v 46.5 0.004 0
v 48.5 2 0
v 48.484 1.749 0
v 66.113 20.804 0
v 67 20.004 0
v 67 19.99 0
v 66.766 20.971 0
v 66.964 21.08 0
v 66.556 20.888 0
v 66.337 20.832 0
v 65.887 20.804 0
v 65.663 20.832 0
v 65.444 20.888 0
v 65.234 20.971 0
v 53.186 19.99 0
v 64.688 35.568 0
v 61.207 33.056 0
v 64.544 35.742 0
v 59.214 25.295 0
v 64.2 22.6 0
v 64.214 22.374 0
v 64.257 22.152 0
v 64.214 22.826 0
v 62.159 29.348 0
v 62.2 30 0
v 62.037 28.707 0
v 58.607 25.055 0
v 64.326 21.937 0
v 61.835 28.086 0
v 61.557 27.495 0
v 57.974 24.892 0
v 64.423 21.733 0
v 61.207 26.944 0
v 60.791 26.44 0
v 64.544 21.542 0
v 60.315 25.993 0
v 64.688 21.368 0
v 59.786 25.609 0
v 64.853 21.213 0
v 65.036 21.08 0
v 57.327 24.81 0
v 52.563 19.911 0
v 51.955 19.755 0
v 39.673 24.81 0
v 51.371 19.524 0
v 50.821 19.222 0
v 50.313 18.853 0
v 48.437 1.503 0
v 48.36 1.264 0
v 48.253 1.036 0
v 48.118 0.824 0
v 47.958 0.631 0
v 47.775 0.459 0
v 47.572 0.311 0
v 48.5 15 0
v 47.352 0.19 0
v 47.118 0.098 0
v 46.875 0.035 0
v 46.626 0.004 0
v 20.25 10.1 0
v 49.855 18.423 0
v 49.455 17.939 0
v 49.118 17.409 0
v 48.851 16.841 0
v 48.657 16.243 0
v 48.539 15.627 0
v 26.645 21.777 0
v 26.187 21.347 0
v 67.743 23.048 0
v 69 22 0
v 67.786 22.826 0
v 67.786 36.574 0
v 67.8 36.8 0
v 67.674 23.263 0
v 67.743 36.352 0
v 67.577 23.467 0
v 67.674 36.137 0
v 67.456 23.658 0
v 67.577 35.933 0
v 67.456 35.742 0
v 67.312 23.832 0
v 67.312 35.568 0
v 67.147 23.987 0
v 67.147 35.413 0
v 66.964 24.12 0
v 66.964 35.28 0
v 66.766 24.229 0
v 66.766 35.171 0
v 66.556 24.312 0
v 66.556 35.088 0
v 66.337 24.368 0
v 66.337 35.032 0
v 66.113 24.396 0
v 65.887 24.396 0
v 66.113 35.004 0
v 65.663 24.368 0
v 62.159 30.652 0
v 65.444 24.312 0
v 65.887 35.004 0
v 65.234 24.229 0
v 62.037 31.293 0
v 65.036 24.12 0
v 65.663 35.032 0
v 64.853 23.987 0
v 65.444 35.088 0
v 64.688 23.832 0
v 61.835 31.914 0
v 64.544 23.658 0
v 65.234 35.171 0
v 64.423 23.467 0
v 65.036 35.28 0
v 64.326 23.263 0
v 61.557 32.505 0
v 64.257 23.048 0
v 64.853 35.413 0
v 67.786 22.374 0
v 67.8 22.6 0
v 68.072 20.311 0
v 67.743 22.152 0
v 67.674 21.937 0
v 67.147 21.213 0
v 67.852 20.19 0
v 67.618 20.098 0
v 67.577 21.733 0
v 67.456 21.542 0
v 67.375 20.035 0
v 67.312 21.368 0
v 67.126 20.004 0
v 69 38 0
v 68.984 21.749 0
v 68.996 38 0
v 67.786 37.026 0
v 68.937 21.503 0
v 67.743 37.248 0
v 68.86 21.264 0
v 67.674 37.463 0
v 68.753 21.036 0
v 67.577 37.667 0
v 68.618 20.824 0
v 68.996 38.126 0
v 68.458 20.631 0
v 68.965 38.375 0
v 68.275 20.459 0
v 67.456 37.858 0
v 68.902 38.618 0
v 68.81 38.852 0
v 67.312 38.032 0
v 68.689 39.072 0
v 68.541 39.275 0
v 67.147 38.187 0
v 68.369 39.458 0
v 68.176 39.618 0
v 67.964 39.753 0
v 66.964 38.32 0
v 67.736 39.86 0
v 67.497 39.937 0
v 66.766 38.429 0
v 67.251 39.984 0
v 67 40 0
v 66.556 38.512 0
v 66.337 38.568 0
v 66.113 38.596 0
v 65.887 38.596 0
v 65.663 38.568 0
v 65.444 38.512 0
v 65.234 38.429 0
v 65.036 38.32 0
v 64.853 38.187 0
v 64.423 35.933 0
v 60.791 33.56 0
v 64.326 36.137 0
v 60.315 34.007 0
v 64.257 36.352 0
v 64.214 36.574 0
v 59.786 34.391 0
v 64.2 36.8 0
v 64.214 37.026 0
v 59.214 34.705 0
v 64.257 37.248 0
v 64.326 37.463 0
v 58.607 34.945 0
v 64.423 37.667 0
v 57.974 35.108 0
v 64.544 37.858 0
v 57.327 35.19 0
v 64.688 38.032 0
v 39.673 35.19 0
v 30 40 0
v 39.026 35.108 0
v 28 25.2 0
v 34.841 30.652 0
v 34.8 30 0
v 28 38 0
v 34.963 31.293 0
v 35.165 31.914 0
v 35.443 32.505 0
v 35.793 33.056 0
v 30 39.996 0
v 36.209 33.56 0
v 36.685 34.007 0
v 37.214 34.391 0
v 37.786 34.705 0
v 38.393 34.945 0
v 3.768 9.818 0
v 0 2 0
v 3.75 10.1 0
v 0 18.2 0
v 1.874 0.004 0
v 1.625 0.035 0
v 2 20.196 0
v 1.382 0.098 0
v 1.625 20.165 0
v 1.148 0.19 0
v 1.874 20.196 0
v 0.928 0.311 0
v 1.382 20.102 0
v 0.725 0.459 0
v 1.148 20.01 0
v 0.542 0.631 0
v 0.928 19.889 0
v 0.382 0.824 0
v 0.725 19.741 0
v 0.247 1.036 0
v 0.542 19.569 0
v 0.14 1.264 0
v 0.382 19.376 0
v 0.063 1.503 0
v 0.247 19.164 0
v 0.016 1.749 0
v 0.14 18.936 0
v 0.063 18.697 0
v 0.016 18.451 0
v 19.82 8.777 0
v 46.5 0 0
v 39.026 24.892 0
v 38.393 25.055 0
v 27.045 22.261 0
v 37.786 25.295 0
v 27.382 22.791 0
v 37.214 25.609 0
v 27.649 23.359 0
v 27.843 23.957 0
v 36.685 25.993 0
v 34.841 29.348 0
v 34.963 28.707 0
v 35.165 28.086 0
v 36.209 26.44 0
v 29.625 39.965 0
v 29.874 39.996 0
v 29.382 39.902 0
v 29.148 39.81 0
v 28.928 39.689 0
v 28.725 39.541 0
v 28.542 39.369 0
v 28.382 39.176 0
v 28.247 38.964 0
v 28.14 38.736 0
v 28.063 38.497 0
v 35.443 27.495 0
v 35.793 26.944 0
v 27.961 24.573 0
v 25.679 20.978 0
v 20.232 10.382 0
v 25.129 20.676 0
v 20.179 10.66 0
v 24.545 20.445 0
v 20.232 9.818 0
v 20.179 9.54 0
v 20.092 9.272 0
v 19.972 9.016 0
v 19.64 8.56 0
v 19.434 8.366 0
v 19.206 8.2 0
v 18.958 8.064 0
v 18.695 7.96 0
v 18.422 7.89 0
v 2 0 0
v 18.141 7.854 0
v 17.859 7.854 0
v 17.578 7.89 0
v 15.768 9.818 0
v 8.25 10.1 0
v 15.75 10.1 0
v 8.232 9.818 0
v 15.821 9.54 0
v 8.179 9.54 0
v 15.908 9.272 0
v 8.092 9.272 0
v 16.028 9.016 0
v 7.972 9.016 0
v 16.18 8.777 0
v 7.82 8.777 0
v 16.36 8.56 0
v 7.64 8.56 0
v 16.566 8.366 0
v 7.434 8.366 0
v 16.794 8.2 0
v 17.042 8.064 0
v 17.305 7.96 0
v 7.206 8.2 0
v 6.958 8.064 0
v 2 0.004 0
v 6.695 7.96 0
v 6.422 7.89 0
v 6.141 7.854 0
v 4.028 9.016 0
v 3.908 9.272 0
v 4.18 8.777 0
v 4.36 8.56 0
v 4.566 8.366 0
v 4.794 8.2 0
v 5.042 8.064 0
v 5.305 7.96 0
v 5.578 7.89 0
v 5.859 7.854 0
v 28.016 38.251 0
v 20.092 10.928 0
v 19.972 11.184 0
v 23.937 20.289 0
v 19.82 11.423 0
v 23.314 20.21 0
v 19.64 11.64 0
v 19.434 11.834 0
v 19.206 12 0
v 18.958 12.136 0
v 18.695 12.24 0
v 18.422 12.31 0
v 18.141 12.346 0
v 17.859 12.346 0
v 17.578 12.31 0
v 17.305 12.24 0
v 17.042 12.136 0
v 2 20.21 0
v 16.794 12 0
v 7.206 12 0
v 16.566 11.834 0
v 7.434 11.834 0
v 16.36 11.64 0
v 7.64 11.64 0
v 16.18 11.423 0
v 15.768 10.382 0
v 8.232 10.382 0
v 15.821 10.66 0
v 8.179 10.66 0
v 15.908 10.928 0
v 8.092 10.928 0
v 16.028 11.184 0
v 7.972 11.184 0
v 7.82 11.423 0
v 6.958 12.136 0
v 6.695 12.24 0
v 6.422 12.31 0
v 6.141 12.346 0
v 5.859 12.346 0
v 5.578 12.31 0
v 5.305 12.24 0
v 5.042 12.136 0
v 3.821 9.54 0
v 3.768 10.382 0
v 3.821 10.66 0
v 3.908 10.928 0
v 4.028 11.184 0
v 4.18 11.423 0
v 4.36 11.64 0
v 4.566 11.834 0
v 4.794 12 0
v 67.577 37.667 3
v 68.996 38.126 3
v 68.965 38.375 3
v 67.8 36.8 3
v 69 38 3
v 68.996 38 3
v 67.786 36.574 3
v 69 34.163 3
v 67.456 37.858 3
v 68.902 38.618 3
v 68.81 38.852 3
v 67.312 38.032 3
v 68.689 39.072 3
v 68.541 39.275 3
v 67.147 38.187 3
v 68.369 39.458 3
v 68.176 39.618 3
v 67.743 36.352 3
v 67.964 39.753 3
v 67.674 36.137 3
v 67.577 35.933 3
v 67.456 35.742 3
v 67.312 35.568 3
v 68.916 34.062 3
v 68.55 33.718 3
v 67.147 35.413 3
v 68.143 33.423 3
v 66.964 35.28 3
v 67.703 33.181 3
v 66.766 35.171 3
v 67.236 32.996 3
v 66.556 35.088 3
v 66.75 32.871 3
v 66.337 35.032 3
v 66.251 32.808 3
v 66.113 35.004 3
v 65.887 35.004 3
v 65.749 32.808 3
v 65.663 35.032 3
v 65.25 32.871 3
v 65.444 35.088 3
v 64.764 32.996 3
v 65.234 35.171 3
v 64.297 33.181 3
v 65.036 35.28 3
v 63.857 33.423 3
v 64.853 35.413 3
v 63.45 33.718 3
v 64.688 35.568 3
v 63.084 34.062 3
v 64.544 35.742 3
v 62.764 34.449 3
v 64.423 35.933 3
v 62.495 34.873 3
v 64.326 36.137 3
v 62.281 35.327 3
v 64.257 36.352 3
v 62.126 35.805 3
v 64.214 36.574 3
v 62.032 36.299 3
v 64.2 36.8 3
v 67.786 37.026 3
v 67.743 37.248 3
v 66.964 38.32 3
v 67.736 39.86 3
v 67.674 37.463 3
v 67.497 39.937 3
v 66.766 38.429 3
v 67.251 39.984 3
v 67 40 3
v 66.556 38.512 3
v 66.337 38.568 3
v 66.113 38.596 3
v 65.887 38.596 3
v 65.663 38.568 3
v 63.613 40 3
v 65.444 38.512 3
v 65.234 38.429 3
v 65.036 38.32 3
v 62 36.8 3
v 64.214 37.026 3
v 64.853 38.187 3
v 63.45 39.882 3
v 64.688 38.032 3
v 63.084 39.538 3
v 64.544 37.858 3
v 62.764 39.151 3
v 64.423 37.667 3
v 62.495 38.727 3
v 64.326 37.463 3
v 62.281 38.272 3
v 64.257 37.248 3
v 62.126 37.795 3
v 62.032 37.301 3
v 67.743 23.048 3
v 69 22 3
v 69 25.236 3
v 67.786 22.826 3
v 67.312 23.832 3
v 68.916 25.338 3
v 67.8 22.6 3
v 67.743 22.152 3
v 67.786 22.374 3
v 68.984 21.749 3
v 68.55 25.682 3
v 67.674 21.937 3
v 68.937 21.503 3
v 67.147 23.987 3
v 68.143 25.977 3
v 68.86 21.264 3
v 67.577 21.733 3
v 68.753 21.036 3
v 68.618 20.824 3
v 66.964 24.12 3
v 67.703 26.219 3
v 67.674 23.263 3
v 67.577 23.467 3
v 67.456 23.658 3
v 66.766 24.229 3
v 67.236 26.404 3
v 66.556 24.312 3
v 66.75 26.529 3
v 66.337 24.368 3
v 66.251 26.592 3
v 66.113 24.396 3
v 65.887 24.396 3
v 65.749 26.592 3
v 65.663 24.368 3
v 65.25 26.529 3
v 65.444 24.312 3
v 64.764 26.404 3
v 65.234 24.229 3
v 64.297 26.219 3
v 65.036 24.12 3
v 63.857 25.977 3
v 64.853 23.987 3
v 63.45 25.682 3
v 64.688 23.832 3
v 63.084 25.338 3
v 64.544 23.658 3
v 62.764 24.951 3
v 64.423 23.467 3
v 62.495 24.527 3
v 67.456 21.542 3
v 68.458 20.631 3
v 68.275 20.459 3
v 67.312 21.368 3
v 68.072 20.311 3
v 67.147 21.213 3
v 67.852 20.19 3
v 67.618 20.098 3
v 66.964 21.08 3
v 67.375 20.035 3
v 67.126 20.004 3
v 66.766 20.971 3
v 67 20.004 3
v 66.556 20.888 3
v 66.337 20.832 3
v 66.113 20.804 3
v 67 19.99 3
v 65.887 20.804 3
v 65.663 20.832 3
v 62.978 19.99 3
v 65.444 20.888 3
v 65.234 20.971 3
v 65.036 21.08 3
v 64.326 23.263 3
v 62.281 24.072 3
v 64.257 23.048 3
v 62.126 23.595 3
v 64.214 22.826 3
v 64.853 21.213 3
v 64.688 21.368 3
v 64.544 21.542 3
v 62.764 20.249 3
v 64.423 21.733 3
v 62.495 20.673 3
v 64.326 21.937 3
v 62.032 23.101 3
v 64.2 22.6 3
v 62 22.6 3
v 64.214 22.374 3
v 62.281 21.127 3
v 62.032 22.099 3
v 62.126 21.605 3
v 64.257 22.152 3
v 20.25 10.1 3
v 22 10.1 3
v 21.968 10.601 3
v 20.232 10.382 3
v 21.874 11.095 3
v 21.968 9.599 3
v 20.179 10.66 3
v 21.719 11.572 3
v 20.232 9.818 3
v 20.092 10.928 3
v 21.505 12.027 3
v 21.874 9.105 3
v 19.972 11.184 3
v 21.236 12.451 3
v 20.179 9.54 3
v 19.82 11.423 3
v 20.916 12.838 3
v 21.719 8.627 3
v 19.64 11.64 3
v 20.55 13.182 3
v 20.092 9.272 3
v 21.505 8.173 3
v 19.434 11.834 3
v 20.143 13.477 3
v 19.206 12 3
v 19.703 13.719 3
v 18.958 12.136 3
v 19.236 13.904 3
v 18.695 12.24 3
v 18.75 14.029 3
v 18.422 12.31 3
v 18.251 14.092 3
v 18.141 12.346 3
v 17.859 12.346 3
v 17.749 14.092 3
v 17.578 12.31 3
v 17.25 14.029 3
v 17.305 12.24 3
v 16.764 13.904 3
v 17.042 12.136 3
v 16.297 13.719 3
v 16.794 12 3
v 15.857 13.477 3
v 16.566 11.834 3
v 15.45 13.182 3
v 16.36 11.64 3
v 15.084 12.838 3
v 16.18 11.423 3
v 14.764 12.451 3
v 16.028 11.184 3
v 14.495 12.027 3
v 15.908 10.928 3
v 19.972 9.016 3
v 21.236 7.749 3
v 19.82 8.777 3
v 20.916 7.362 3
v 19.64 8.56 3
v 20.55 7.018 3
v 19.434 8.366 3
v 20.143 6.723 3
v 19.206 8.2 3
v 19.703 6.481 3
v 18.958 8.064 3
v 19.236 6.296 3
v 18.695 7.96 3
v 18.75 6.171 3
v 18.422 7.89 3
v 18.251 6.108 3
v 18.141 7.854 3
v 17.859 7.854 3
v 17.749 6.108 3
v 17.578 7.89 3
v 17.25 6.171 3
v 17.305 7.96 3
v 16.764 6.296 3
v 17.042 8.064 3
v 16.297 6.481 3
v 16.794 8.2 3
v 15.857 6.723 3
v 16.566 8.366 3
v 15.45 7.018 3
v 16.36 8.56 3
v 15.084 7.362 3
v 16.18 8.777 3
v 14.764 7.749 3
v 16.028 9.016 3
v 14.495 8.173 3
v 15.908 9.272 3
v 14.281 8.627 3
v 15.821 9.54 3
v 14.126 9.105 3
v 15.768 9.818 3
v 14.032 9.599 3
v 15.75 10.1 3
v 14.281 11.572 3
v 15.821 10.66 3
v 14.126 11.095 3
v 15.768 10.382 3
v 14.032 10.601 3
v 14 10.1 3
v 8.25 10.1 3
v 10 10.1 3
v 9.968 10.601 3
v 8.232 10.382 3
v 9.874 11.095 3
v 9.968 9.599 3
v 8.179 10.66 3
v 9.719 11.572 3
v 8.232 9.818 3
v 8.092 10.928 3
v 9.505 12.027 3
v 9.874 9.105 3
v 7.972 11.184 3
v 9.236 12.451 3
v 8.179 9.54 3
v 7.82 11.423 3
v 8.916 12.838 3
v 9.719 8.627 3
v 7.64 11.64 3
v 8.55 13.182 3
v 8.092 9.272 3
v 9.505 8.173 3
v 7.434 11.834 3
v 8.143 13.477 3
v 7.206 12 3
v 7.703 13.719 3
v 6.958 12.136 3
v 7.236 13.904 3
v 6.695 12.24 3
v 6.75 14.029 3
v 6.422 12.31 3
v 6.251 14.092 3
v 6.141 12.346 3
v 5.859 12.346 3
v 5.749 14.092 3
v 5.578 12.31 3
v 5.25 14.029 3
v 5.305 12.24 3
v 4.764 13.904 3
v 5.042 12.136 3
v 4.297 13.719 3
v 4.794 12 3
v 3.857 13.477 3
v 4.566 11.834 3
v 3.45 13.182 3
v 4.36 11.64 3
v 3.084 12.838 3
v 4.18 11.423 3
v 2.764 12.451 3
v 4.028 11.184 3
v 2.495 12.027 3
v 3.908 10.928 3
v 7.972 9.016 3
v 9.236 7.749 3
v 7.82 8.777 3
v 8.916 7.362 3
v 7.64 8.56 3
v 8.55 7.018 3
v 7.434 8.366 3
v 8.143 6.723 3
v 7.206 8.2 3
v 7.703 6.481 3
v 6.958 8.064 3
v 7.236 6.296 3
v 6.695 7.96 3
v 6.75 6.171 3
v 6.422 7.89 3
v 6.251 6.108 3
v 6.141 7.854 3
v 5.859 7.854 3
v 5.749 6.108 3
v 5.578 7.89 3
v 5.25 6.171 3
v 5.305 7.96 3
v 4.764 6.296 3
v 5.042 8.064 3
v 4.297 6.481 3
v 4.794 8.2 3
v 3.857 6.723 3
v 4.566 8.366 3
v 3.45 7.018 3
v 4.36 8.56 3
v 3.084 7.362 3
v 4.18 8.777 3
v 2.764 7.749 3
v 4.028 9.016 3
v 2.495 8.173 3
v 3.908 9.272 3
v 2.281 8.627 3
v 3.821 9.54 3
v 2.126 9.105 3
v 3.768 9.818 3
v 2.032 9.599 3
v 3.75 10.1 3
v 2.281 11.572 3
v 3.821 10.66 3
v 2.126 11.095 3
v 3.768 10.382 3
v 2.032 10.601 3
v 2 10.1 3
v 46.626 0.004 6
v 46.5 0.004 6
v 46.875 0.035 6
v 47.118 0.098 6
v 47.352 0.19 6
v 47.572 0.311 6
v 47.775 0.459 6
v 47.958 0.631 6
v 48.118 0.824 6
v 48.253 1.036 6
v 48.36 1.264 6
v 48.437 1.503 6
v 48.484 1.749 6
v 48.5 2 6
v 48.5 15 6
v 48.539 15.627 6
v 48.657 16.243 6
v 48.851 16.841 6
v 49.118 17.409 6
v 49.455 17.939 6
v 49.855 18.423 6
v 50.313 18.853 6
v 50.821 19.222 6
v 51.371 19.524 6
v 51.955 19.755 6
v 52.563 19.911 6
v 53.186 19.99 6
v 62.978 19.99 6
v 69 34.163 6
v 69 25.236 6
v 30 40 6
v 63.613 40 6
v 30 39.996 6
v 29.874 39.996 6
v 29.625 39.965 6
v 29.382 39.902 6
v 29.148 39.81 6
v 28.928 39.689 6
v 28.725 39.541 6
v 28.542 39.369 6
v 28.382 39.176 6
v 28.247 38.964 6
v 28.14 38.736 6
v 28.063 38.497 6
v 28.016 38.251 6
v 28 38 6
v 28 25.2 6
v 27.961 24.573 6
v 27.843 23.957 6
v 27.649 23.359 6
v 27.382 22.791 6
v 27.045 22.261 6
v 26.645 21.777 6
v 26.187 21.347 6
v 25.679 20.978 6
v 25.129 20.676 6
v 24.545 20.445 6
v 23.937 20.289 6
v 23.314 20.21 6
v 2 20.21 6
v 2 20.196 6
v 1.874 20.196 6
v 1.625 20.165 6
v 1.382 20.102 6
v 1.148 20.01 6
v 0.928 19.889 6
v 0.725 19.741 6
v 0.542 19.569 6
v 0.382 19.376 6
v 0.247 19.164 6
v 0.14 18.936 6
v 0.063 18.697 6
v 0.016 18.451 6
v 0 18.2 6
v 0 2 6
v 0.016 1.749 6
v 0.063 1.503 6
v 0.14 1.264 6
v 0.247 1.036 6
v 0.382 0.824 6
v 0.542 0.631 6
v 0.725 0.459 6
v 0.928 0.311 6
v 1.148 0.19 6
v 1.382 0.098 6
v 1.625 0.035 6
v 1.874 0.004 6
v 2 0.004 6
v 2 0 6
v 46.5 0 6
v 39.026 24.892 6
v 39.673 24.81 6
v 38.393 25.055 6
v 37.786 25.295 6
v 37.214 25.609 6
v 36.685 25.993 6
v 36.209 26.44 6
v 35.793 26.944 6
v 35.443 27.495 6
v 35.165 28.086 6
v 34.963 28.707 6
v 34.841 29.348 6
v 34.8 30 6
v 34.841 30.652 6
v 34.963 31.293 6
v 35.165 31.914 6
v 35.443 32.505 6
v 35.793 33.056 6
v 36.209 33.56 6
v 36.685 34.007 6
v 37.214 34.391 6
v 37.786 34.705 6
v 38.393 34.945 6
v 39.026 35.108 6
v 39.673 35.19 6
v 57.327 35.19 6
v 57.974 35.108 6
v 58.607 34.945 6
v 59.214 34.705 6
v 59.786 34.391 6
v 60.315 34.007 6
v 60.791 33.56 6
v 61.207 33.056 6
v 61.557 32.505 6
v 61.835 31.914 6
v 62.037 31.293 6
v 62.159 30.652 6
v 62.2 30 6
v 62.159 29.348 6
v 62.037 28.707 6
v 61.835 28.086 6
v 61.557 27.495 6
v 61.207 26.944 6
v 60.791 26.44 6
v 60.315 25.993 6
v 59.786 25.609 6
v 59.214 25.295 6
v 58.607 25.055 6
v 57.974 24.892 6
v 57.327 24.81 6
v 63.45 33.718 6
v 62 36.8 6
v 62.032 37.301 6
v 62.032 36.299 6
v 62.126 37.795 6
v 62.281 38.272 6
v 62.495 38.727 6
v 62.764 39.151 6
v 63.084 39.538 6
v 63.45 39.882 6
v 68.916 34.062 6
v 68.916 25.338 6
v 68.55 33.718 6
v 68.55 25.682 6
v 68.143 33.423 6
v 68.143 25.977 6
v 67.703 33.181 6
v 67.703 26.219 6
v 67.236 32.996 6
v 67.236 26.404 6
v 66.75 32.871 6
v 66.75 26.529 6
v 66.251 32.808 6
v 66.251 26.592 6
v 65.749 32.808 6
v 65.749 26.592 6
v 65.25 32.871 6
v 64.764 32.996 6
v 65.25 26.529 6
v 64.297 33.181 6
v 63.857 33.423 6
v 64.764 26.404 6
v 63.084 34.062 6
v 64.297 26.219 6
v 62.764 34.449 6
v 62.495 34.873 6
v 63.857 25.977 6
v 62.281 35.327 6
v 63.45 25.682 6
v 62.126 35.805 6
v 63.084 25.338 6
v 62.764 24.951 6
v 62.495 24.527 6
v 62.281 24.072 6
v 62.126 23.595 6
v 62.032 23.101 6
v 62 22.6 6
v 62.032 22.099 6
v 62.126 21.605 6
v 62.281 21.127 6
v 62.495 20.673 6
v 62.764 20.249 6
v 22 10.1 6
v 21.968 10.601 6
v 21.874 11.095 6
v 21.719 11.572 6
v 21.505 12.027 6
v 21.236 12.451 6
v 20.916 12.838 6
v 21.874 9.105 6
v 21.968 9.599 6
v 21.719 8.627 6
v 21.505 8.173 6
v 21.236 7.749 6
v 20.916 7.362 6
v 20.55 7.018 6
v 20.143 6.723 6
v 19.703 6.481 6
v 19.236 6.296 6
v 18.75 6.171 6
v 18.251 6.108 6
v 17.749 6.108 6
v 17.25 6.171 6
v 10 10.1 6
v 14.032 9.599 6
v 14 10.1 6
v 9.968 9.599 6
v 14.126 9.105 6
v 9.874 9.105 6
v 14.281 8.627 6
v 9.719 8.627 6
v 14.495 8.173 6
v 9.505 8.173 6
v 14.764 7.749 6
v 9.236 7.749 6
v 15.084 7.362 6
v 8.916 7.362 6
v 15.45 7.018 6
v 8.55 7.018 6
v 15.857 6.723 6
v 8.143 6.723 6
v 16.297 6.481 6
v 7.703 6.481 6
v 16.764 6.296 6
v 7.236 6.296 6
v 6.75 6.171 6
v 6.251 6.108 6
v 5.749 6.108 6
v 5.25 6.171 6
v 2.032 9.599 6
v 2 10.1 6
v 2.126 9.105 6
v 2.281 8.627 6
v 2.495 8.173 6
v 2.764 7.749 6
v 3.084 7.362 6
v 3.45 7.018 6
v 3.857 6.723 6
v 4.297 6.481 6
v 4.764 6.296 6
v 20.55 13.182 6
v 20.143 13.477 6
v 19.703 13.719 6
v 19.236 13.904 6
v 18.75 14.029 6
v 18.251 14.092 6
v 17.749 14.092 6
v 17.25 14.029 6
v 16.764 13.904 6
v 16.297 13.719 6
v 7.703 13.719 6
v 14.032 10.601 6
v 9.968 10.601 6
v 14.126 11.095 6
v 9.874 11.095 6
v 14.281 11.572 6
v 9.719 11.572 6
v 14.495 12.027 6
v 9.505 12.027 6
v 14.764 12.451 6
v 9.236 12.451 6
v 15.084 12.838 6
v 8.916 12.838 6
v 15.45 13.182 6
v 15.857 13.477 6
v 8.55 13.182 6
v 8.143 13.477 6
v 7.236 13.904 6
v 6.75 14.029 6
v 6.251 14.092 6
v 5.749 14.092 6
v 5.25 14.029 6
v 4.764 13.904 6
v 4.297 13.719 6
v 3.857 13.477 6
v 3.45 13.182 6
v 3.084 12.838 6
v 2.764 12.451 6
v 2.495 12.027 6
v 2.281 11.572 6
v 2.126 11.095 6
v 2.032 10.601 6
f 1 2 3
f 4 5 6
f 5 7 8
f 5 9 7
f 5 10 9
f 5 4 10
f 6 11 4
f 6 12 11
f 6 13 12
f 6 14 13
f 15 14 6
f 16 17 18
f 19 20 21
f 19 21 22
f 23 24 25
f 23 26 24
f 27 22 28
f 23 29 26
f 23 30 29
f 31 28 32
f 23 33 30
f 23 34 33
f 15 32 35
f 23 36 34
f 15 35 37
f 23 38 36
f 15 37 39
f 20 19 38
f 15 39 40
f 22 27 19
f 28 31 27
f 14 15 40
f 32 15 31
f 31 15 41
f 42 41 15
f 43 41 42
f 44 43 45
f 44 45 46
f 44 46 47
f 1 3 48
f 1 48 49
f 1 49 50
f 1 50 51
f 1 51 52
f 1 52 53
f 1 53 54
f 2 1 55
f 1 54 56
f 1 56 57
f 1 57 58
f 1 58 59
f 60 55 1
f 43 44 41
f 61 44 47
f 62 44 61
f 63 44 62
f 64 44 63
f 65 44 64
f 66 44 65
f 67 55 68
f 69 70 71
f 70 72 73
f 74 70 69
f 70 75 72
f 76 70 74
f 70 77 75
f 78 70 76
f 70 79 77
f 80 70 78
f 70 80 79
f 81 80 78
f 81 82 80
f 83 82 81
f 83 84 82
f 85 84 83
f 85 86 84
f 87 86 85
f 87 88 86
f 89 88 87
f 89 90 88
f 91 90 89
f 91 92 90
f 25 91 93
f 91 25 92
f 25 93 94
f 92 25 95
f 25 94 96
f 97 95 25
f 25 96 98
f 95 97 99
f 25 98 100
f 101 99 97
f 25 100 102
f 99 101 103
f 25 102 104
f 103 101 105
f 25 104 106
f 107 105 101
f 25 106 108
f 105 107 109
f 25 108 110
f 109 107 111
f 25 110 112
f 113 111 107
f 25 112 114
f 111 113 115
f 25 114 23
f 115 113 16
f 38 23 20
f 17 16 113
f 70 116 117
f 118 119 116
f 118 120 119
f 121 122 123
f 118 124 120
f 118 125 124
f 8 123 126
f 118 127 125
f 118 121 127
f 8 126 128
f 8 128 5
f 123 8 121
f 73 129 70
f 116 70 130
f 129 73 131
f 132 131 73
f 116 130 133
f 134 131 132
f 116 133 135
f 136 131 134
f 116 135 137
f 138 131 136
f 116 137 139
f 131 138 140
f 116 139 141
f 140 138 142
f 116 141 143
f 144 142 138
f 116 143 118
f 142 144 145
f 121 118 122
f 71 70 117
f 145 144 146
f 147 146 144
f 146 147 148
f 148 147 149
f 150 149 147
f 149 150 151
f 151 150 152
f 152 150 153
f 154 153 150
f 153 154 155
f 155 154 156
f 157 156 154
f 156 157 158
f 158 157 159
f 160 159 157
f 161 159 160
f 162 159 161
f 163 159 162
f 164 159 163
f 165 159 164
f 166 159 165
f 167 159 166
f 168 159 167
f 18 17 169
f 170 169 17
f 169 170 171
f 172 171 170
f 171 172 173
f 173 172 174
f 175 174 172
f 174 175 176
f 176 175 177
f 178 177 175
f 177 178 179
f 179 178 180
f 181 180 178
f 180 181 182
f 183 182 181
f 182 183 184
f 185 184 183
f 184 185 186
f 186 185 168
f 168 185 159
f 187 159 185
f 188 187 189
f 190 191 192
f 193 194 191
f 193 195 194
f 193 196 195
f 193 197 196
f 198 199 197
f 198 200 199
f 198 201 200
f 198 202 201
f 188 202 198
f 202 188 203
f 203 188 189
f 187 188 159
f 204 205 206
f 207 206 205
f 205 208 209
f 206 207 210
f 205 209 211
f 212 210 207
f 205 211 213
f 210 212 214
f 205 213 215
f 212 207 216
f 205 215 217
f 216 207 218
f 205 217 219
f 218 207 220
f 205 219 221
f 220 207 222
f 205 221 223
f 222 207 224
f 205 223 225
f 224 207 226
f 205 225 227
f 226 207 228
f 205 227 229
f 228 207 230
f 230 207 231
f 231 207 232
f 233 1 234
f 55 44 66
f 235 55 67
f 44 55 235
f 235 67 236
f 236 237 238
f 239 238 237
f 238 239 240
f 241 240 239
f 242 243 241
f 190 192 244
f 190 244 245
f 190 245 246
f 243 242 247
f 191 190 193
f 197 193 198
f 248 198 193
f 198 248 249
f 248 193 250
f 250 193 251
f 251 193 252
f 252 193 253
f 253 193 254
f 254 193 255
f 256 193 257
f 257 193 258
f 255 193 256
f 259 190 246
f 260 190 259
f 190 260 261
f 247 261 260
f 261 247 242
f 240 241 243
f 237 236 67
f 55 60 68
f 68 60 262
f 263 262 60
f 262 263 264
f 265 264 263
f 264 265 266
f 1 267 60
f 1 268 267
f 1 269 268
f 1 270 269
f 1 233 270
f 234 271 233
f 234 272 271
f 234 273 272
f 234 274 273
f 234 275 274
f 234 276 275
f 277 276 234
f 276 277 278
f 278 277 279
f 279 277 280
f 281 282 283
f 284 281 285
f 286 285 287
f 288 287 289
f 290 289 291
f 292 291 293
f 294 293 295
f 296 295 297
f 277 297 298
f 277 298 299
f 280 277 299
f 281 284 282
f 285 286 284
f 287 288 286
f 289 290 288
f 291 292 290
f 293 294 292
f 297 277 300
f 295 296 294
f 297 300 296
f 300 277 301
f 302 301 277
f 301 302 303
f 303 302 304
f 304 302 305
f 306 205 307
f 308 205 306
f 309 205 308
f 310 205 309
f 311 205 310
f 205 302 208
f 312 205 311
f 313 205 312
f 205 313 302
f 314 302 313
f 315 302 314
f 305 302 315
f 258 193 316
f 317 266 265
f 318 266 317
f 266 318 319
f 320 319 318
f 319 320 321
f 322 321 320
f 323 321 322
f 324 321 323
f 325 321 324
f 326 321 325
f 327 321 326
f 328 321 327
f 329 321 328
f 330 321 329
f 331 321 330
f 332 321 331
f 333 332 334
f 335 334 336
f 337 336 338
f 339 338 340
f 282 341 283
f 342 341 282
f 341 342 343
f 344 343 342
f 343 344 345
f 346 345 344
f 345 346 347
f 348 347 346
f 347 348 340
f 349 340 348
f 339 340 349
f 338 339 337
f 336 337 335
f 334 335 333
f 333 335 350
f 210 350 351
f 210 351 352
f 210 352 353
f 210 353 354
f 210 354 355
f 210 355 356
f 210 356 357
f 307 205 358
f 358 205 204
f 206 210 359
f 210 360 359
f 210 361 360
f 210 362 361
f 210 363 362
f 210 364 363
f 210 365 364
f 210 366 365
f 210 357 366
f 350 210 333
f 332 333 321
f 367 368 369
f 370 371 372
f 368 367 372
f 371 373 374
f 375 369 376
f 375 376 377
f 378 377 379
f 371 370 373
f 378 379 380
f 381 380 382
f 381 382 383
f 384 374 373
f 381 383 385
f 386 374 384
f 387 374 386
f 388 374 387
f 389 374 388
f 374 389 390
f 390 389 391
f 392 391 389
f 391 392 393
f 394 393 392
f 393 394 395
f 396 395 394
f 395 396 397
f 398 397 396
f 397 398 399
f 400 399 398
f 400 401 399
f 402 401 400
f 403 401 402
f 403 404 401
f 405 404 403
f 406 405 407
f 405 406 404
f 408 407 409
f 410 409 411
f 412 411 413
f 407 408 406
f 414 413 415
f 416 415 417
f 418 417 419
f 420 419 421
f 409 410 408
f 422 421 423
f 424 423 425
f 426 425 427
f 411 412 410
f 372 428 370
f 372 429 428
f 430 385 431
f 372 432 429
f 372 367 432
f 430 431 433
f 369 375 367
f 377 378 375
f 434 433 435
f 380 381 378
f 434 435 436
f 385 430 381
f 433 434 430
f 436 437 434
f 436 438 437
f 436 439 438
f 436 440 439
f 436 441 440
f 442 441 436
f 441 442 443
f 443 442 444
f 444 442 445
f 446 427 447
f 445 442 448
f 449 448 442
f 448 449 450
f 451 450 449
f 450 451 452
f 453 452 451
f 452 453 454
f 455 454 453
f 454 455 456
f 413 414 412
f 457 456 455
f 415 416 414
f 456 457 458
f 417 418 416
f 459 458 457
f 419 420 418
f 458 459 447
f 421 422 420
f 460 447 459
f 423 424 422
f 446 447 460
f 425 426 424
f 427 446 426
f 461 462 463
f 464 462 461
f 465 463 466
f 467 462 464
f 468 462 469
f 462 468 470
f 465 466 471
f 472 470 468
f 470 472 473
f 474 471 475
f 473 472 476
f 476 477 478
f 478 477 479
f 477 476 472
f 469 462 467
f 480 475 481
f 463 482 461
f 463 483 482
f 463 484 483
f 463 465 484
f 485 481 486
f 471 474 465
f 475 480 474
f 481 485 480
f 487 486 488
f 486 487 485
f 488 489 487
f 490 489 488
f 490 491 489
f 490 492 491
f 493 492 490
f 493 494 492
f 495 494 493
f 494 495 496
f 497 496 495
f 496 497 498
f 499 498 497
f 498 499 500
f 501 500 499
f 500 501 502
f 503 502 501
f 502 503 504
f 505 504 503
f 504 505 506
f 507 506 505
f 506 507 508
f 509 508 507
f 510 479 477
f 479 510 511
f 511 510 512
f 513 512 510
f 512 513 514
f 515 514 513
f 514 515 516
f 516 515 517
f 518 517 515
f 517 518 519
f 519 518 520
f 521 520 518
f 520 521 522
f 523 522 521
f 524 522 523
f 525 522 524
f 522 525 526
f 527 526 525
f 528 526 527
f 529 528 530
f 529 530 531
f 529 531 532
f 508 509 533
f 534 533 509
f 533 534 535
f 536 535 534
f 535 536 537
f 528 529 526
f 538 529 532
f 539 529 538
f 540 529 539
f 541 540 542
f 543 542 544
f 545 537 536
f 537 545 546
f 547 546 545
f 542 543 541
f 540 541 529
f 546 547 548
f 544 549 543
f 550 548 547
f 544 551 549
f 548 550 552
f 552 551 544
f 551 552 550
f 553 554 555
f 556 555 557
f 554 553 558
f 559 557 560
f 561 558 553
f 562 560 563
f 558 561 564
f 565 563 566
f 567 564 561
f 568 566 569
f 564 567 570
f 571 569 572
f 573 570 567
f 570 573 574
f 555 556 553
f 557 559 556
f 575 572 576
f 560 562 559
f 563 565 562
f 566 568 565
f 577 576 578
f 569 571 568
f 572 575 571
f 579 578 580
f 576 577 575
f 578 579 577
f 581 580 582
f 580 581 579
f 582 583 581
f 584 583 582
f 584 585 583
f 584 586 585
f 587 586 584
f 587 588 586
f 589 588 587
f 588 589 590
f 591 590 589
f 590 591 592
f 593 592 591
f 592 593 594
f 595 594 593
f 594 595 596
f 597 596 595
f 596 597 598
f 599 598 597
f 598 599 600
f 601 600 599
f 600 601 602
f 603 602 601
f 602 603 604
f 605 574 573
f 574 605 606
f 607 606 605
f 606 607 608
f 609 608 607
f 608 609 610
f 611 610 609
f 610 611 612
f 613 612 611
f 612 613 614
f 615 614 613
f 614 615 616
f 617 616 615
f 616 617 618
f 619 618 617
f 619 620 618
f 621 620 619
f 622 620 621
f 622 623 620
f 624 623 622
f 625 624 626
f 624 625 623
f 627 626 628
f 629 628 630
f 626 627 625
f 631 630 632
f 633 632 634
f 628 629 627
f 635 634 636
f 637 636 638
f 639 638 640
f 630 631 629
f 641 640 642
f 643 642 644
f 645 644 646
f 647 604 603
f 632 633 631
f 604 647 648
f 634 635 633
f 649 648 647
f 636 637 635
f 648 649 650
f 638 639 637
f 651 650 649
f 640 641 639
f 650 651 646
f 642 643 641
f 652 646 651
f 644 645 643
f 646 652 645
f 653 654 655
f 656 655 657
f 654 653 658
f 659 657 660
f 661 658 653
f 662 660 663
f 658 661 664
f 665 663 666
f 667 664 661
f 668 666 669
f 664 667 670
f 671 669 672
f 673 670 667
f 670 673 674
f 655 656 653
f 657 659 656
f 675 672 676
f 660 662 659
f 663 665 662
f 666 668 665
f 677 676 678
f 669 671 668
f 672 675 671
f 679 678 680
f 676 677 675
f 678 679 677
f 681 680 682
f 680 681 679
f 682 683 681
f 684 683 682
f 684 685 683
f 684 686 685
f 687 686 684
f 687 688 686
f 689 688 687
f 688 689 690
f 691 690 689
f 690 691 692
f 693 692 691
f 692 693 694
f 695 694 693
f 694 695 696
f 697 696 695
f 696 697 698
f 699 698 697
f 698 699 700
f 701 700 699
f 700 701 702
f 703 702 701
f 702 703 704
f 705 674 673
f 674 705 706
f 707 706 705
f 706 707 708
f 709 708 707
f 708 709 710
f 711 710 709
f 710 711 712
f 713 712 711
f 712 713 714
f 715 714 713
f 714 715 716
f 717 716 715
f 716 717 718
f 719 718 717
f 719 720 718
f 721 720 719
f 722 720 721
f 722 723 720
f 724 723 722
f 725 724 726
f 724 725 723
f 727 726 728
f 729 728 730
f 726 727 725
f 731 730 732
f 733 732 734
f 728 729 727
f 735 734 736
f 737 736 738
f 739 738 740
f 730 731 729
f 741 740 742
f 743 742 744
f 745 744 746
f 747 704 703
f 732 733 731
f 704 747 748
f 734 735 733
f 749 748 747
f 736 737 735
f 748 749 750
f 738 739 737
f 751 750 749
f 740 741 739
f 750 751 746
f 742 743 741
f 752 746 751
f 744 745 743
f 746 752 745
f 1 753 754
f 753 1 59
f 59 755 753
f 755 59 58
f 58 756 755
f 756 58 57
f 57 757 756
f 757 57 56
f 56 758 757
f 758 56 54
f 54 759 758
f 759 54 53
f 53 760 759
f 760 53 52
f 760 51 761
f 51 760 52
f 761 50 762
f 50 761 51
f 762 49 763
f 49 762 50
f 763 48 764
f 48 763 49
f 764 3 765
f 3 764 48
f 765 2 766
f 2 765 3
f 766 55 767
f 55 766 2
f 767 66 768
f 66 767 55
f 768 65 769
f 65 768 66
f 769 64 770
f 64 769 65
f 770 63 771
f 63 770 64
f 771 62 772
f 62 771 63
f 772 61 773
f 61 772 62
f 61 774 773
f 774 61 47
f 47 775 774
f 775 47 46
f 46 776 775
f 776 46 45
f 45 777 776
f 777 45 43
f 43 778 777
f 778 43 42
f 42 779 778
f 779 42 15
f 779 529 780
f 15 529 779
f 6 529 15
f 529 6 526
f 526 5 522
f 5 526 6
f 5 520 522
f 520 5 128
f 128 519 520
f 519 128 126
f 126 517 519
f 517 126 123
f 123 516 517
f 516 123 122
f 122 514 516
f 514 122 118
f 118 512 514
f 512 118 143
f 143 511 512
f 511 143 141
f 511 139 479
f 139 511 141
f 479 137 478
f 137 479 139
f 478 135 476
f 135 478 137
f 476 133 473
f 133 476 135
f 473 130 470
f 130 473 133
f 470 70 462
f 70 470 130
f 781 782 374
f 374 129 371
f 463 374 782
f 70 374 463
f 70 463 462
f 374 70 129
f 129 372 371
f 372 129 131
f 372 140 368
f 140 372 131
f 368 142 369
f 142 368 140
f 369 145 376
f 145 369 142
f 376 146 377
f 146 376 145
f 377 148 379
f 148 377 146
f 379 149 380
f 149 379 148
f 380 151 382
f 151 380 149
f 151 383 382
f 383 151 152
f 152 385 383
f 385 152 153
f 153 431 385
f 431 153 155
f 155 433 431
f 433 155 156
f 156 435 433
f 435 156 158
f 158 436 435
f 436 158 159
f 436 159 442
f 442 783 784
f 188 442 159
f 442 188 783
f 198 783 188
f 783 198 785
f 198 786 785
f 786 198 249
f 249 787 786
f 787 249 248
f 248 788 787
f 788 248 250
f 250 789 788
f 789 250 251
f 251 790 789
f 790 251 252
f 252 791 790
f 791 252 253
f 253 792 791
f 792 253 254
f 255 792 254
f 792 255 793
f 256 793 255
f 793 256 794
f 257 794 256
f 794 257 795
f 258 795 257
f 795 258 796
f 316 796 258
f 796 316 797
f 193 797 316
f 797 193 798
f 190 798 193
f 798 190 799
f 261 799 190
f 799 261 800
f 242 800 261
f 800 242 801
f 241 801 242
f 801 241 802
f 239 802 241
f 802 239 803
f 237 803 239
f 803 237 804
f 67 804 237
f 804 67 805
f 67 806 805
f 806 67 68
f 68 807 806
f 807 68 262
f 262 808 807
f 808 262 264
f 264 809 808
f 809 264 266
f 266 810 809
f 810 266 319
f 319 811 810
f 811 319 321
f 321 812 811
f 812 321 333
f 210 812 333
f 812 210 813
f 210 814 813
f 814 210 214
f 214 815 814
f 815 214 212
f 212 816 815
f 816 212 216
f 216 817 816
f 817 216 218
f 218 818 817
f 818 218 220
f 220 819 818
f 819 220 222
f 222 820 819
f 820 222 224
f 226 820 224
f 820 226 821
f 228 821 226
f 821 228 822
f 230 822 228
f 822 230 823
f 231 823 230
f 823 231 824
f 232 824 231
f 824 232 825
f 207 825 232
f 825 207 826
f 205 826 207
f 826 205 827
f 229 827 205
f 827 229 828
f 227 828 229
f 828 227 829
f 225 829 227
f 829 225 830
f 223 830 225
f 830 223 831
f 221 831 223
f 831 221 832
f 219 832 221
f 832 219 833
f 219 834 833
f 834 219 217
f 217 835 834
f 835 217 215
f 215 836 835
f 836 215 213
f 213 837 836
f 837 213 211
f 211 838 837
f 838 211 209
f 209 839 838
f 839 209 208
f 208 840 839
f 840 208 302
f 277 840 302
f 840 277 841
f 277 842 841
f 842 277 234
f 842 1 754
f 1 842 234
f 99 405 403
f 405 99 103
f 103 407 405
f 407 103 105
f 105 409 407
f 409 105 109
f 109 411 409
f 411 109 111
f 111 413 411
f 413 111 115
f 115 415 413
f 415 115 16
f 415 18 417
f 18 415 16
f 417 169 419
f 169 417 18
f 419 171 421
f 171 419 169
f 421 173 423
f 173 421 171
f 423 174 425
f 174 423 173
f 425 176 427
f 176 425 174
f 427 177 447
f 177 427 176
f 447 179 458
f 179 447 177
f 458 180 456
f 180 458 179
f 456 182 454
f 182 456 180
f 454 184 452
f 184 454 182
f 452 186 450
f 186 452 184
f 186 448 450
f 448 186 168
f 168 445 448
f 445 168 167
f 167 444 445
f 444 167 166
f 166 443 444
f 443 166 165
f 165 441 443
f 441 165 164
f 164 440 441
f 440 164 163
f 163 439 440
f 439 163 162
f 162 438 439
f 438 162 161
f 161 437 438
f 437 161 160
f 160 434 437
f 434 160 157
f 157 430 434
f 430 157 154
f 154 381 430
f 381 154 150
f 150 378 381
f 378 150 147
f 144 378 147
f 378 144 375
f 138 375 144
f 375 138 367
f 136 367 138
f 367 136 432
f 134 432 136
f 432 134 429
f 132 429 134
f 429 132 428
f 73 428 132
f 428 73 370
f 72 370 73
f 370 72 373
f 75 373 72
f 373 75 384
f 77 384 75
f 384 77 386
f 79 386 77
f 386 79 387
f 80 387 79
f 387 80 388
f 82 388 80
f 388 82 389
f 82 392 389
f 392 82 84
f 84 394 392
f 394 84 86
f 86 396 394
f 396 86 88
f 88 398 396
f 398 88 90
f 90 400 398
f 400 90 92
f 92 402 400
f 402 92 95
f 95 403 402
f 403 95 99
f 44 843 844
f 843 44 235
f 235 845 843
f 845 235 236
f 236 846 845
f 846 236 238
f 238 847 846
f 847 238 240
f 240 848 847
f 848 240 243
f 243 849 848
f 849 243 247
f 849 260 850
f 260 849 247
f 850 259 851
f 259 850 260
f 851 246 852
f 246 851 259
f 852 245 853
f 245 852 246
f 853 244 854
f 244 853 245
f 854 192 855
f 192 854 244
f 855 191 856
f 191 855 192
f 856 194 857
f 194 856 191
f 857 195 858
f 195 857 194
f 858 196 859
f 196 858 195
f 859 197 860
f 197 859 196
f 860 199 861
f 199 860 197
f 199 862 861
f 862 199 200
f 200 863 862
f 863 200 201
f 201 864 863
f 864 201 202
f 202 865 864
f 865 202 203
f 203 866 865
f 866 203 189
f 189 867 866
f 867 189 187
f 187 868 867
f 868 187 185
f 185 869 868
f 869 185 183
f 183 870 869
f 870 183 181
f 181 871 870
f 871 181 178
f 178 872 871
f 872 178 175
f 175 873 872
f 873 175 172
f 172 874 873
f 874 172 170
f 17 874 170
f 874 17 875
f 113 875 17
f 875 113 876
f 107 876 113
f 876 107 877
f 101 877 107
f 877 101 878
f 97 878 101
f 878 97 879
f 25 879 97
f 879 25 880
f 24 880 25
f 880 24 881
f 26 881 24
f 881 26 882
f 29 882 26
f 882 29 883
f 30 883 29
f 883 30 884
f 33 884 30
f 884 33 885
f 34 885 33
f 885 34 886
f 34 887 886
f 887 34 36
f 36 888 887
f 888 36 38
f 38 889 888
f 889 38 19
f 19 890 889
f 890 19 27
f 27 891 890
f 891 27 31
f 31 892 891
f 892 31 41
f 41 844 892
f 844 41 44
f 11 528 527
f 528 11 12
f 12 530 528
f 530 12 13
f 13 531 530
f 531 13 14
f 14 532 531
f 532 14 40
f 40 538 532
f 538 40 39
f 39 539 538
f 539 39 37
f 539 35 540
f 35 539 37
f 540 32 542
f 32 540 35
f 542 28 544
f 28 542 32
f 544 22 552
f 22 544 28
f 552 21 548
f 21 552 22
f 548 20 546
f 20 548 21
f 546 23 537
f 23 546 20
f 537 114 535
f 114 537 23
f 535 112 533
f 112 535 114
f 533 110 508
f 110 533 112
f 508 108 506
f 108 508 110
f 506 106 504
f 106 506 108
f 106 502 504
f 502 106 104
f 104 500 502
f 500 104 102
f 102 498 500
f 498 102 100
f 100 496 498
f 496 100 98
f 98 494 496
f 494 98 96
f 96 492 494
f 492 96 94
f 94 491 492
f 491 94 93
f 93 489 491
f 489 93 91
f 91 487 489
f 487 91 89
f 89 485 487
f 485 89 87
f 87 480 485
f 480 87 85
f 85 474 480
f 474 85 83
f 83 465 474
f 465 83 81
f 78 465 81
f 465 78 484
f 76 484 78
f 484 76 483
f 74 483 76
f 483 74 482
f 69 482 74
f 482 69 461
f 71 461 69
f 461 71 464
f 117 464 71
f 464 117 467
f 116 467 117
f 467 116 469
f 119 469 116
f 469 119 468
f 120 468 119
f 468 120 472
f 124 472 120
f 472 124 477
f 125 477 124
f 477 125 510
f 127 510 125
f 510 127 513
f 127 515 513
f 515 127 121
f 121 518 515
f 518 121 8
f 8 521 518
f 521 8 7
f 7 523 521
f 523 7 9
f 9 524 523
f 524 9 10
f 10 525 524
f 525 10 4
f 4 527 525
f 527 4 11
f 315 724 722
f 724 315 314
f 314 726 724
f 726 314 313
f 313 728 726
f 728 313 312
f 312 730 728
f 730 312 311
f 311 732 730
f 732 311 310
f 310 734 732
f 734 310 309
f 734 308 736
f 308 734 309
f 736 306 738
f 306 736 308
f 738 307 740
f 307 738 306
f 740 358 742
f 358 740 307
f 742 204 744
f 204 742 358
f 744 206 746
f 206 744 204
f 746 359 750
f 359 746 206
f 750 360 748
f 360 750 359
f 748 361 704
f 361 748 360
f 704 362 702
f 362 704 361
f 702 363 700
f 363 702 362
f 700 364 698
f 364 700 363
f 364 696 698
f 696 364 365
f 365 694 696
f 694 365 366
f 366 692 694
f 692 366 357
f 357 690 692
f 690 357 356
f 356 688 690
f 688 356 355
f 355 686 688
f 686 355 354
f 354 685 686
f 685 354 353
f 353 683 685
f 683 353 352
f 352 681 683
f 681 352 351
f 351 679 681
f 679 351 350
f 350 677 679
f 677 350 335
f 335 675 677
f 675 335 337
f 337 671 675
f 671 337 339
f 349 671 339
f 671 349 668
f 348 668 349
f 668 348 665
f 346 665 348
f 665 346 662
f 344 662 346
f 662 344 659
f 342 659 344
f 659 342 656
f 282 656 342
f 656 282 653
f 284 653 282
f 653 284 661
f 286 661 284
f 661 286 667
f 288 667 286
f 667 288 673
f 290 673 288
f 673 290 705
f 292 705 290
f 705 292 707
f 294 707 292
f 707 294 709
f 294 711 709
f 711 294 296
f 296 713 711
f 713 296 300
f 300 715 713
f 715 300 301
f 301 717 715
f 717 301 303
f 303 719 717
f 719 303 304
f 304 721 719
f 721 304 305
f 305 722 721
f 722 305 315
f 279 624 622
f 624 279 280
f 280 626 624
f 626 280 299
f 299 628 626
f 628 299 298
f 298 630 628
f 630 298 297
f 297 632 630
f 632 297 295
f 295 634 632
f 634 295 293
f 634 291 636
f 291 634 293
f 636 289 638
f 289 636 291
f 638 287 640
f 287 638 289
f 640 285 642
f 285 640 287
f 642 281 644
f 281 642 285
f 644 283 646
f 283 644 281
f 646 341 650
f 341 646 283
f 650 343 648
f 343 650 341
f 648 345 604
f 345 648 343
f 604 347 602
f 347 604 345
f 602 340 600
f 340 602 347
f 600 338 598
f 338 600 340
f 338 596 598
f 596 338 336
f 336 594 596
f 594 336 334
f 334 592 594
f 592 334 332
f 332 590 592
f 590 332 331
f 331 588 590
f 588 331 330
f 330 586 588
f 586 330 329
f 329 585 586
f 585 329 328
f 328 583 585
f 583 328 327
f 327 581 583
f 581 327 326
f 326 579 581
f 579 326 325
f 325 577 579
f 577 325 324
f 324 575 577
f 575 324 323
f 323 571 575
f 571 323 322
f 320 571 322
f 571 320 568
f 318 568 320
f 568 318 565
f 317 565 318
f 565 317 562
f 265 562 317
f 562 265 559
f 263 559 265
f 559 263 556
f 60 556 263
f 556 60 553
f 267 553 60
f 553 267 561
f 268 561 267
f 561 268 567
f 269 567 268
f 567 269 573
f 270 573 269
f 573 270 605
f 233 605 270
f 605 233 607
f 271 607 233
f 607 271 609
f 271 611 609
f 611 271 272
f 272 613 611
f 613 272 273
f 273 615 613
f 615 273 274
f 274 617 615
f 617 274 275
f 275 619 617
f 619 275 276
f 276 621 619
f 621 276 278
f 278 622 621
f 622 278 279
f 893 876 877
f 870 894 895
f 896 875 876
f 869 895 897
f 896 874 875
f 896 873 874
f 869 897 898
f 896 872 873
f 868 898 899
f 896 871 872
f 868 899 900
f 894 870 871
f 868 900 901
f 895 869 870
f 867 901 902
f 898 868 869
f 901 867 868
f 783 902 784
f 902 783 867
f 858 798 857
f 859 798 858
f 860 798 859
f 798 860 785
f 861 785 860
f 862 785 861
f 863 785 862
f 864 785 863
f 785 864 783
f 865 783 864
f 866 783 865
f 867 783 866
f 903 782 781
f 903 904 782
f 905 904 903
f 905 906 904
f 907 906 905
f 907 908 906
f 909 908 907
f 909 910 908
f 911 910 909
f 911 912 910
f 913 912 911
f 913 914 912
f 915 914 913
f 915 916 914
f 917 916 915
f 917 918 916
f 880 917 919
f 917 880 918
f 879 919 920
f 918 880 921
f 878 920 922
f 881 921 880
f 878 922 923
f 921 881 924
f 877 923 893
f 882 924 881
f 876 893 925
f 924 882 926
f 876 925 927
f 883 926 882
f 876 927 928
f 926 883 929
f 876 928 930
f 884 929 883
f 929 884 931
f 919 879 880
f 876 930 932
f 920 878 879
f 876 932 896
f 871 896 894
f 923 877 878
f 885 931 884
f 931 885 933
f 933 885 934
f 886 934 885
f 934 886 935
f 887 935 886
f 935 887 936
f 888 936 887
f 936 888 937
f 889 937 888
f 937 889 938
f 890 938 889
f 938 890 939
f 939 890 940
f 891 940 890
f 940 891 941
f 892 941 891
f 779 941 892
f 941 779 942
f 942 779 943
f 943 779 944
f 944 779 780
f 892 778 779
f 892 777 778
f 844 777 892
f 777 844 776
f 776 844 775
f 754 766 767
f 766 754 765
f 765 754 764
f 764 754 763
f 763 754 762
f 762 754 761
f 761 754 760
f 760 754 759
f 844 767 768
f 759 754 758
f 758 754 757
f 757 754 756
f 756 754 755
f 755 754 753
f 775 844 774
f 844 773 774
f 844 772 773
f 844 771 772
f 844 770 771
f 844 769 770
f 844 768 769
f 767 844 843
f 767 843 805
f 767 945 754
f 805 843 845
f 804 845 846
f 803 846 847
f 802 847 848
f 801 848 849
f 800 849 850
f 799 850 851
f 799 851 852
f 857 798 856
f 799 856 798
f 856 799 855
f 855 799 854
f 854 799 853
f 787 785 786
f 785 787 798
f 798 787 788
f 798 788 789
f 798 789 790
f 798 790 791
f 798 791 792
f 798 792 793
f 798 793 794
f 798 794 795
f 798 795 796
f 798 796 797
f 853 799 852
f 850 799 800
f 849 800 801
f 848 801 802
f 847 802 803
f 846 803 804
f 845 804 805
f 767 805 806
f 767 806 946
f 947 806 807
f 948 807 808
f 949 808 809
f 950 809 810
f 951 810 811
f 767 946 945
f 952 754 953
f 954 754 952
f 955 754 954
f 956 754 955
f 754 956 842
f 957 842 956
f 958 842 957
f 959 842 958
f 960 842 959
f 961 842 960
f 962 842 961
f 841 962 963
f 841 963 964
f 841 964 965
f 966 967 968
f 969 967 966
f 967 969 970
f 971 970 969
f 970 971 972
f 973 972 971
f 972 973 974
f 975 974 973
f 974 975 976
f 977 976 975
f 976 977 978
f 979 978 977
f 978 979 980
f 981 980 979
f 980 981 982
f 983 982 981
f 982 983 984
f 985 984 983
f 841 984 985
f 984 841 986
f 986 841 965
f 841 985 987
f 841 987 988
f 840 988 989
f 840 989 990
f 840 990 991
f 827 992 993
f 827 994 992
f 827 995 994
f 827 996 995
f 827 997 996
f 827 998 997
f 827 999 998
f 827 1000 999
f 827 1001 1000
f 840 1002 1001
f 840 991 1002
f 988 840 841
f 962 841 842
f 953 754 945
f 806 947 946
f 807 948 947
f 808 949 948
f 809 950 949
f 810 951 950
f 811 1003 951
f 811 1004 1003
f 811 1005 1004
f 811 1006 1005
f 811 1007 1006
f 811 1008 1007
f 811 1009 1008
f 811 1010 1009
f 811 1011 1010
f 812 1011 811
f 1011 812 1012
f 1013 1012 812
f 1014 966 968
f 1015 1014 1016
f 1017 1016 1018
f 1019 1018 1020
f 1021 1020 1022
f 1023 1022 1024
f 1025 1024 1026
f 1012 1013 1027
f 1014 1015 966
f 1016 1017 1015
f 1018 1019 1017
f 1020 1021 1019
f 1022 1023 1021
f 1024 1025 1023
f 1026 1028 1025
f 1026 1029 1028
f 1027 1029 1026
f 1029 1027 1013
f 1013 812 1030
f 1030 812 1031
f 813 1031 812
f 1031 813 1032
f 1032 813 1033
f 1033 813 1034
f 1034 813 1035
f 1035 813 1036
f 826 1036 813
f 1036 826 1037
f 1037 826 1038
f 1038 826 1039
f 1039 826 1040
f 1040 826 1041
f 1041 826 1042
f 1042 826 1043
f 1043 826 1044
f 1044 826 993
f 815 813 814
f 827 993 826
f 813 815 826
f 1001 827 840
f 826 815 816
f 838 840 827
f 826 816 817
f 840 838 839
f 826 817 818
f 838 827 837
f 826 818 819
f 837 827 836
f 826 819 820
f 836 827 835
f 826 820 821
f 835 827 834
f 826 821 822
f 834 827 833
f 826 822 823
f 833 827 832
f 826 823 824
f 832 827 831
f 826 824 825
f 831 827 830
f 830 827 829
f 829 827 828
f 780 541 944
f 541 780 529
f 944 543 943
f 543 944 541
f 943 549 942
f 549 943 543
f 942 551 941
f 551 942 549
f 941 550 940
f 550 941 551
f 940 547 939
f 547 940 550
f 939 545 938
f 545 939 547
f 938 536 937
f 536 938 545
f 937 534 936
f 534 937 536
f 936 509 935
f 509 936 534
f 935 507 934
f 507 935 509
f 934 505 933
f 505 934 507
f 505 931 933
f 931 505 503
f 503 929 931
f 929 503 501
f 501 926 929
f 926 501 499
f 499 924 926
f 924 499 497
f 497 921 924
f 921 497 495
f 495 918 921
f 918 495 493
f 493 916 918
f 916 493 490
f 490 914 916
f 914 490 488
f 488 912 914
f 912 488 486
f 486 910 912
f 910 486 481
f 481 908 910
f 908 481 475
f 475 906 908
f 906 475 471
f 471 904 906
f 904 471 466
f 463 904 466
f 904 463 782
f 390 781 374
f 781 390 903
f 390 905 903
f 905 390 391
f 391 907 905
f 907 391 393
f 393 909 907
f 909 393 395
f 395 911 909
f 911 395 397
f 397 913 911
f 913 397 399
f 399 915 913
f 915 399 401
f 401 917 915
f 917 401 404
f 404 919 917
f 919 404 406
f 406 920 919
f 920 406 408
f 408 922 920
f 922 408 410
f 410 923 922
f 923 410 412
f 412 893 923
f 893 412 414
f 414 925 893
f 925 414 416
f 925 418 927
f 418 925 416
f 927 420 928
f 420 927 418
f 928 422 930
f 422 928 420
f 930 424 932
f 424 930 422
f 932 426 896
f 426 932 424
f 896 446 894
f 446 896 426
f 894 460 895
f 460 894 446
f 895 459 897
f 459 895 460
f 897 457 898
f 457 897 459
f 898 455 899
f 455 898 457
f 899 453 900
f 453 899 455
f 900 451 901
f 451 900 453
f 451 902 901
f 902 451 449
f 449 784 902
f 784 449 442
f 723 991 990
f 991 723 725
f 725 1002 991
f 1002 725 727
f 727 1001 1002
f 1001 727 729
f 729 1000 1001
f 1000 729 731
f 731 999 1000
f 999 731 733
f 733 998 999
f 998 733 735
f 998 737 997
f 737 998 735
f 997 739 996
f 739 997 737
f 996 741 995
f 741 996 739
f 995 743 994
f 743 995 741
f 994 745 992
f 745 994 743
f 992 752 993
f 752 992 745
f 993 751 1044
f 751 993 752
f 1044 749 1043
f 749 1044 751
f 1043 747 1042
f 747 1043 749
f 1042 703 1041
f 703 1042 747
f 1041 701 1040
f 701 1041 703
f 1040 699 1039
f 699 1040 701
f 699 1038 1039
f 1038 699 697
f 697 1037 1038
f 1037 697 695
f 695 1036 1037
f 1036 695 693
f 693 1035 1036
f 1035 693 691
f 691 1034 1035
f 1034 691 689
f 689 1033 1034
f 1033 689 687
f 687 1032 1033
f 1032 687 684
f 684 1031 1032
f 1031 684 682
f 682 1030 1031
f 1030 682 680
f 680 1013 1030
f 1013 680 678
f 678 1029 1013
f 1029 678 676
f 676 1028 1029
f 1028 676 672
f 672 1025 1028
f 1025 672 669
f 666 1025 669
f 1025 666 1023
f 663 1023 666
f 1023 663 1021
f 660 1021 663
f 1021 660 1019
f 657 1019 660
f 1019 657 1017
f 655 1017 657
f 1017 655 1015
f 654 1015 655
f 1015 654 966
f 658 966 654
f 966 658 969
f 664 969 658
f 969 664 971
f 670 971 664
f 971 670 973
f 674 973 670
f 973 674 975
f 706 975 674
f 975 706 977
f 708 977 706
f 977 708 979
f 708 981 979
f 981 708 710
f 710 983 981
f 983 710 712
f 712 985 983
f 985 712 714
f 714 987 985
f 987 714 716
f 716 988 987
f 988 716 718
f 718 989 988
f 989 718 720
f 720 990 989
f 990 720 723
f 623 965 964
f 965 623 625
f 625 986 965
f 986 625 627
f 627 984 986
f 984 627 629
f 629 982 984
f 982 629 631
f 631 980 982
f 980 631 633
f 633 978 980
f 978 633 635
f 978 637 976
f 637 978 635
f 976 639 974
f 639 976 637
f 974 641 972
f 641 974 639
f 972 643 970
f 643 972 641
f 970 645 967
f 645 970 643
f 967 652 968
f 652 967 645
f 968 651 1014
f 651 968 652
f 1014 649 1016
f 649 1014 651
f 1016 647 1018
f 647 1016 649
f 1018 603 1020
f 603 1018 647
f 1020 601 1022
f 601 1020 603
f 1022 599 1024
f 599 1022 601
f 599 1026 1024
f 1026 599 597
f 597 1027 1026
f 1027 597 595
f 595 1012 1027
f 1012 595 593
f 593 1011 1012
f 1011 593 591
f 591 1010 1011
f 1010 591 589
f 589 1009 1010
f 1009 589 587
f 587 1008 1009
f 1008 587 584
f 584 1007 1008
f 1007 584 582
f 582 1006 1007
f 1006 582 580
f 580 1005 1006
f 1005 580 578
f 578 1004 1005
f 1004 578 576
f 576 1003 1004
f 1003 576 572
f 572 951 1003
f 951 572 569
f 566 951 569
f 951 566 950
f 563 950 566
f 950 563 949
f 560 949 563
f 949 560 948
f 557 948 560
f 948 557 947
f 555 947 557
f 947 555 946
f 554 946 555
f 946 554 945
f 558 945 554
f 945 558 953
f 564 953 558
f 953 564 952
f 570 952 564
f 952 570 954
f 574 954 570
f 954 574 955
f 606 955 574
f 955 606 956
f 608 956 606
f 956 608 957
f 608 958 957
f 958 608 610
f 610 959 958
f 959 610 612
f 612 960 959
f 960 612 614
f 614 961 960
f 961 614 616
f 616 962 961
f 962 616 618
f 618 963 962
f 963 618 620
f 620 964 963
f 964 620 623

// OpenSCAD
$fn = 50;

width = 69;
height = 40;

module round_corner(r) difference() {
  translate([-0.1, -0.1]) square([r + 0.1, r + 0.1]);
  translate([r, r]) circle(r);
}

module body(thickness, s1, s2) linear_extrude(height = thickness) difference() {
  square([width, height]);

  // screw holes
  translate([6, 10.1]) circle(d = s1);
  translate([18, 10.1]) circle(d = s1);

  translate([width - 3, height - 1.8 - 1.4]) circle(d = s2);
  translate([width - 3, height - 1.8 * 2 - 1.4 * 2 - 11]) circle(d = s2);

  // stadium hole
  hull() {
    from_left = 12;
    from_top = 10;
    from_center_to_center = 17;

    translate([width - from_left, height - from_top]) circle(r = 5.2);
    translate([width - from_left - from_center_to_center, height - from_top]) circle(r = 5.2);
  }

  // remove bottom-right section
  hull() {
    translate([48.5 + 5, height - 25]) circle(r = 5);
    translate([width, height - 25]) circle(r = 5);
    translate([48.5 + 5, 0]) circle(r = 5);
    translate([width, 0]) circle(r = 5);
  }

  // remove top-left section
  hull() {
    translate([0, 20.2 + 5]) circle(r = 5);
    translate([28 - 5, 20.2 + 5]) circle(r = 5);
    translate([28 - 5, height]) circle(r = 5);
    translate([0, height]) circle(r = 5);
  }

  // round all remaining corners
  round_corner(2);
  translate([48.5, 0]) mirror([1, 0]) round_corner(2);
  translate([width, height - 20]) mirror([1, 0]) round_corner(2);
  translate([width, height]) mirror([1, 1]) round_corner(2);
  translate([0,  20.2]) mirror([0, 1]) round_corner(2);
  translate([28,  height]) mirror([0, 1]) round_corner(2);
}

side = "left";

body(thickness = 3, s1 = 4.5, s2 = 3.6);
translate([0, 0, side == "right" ? -3 : 3]) body(thickness = 3, s1 = 8, s2 = 8);
